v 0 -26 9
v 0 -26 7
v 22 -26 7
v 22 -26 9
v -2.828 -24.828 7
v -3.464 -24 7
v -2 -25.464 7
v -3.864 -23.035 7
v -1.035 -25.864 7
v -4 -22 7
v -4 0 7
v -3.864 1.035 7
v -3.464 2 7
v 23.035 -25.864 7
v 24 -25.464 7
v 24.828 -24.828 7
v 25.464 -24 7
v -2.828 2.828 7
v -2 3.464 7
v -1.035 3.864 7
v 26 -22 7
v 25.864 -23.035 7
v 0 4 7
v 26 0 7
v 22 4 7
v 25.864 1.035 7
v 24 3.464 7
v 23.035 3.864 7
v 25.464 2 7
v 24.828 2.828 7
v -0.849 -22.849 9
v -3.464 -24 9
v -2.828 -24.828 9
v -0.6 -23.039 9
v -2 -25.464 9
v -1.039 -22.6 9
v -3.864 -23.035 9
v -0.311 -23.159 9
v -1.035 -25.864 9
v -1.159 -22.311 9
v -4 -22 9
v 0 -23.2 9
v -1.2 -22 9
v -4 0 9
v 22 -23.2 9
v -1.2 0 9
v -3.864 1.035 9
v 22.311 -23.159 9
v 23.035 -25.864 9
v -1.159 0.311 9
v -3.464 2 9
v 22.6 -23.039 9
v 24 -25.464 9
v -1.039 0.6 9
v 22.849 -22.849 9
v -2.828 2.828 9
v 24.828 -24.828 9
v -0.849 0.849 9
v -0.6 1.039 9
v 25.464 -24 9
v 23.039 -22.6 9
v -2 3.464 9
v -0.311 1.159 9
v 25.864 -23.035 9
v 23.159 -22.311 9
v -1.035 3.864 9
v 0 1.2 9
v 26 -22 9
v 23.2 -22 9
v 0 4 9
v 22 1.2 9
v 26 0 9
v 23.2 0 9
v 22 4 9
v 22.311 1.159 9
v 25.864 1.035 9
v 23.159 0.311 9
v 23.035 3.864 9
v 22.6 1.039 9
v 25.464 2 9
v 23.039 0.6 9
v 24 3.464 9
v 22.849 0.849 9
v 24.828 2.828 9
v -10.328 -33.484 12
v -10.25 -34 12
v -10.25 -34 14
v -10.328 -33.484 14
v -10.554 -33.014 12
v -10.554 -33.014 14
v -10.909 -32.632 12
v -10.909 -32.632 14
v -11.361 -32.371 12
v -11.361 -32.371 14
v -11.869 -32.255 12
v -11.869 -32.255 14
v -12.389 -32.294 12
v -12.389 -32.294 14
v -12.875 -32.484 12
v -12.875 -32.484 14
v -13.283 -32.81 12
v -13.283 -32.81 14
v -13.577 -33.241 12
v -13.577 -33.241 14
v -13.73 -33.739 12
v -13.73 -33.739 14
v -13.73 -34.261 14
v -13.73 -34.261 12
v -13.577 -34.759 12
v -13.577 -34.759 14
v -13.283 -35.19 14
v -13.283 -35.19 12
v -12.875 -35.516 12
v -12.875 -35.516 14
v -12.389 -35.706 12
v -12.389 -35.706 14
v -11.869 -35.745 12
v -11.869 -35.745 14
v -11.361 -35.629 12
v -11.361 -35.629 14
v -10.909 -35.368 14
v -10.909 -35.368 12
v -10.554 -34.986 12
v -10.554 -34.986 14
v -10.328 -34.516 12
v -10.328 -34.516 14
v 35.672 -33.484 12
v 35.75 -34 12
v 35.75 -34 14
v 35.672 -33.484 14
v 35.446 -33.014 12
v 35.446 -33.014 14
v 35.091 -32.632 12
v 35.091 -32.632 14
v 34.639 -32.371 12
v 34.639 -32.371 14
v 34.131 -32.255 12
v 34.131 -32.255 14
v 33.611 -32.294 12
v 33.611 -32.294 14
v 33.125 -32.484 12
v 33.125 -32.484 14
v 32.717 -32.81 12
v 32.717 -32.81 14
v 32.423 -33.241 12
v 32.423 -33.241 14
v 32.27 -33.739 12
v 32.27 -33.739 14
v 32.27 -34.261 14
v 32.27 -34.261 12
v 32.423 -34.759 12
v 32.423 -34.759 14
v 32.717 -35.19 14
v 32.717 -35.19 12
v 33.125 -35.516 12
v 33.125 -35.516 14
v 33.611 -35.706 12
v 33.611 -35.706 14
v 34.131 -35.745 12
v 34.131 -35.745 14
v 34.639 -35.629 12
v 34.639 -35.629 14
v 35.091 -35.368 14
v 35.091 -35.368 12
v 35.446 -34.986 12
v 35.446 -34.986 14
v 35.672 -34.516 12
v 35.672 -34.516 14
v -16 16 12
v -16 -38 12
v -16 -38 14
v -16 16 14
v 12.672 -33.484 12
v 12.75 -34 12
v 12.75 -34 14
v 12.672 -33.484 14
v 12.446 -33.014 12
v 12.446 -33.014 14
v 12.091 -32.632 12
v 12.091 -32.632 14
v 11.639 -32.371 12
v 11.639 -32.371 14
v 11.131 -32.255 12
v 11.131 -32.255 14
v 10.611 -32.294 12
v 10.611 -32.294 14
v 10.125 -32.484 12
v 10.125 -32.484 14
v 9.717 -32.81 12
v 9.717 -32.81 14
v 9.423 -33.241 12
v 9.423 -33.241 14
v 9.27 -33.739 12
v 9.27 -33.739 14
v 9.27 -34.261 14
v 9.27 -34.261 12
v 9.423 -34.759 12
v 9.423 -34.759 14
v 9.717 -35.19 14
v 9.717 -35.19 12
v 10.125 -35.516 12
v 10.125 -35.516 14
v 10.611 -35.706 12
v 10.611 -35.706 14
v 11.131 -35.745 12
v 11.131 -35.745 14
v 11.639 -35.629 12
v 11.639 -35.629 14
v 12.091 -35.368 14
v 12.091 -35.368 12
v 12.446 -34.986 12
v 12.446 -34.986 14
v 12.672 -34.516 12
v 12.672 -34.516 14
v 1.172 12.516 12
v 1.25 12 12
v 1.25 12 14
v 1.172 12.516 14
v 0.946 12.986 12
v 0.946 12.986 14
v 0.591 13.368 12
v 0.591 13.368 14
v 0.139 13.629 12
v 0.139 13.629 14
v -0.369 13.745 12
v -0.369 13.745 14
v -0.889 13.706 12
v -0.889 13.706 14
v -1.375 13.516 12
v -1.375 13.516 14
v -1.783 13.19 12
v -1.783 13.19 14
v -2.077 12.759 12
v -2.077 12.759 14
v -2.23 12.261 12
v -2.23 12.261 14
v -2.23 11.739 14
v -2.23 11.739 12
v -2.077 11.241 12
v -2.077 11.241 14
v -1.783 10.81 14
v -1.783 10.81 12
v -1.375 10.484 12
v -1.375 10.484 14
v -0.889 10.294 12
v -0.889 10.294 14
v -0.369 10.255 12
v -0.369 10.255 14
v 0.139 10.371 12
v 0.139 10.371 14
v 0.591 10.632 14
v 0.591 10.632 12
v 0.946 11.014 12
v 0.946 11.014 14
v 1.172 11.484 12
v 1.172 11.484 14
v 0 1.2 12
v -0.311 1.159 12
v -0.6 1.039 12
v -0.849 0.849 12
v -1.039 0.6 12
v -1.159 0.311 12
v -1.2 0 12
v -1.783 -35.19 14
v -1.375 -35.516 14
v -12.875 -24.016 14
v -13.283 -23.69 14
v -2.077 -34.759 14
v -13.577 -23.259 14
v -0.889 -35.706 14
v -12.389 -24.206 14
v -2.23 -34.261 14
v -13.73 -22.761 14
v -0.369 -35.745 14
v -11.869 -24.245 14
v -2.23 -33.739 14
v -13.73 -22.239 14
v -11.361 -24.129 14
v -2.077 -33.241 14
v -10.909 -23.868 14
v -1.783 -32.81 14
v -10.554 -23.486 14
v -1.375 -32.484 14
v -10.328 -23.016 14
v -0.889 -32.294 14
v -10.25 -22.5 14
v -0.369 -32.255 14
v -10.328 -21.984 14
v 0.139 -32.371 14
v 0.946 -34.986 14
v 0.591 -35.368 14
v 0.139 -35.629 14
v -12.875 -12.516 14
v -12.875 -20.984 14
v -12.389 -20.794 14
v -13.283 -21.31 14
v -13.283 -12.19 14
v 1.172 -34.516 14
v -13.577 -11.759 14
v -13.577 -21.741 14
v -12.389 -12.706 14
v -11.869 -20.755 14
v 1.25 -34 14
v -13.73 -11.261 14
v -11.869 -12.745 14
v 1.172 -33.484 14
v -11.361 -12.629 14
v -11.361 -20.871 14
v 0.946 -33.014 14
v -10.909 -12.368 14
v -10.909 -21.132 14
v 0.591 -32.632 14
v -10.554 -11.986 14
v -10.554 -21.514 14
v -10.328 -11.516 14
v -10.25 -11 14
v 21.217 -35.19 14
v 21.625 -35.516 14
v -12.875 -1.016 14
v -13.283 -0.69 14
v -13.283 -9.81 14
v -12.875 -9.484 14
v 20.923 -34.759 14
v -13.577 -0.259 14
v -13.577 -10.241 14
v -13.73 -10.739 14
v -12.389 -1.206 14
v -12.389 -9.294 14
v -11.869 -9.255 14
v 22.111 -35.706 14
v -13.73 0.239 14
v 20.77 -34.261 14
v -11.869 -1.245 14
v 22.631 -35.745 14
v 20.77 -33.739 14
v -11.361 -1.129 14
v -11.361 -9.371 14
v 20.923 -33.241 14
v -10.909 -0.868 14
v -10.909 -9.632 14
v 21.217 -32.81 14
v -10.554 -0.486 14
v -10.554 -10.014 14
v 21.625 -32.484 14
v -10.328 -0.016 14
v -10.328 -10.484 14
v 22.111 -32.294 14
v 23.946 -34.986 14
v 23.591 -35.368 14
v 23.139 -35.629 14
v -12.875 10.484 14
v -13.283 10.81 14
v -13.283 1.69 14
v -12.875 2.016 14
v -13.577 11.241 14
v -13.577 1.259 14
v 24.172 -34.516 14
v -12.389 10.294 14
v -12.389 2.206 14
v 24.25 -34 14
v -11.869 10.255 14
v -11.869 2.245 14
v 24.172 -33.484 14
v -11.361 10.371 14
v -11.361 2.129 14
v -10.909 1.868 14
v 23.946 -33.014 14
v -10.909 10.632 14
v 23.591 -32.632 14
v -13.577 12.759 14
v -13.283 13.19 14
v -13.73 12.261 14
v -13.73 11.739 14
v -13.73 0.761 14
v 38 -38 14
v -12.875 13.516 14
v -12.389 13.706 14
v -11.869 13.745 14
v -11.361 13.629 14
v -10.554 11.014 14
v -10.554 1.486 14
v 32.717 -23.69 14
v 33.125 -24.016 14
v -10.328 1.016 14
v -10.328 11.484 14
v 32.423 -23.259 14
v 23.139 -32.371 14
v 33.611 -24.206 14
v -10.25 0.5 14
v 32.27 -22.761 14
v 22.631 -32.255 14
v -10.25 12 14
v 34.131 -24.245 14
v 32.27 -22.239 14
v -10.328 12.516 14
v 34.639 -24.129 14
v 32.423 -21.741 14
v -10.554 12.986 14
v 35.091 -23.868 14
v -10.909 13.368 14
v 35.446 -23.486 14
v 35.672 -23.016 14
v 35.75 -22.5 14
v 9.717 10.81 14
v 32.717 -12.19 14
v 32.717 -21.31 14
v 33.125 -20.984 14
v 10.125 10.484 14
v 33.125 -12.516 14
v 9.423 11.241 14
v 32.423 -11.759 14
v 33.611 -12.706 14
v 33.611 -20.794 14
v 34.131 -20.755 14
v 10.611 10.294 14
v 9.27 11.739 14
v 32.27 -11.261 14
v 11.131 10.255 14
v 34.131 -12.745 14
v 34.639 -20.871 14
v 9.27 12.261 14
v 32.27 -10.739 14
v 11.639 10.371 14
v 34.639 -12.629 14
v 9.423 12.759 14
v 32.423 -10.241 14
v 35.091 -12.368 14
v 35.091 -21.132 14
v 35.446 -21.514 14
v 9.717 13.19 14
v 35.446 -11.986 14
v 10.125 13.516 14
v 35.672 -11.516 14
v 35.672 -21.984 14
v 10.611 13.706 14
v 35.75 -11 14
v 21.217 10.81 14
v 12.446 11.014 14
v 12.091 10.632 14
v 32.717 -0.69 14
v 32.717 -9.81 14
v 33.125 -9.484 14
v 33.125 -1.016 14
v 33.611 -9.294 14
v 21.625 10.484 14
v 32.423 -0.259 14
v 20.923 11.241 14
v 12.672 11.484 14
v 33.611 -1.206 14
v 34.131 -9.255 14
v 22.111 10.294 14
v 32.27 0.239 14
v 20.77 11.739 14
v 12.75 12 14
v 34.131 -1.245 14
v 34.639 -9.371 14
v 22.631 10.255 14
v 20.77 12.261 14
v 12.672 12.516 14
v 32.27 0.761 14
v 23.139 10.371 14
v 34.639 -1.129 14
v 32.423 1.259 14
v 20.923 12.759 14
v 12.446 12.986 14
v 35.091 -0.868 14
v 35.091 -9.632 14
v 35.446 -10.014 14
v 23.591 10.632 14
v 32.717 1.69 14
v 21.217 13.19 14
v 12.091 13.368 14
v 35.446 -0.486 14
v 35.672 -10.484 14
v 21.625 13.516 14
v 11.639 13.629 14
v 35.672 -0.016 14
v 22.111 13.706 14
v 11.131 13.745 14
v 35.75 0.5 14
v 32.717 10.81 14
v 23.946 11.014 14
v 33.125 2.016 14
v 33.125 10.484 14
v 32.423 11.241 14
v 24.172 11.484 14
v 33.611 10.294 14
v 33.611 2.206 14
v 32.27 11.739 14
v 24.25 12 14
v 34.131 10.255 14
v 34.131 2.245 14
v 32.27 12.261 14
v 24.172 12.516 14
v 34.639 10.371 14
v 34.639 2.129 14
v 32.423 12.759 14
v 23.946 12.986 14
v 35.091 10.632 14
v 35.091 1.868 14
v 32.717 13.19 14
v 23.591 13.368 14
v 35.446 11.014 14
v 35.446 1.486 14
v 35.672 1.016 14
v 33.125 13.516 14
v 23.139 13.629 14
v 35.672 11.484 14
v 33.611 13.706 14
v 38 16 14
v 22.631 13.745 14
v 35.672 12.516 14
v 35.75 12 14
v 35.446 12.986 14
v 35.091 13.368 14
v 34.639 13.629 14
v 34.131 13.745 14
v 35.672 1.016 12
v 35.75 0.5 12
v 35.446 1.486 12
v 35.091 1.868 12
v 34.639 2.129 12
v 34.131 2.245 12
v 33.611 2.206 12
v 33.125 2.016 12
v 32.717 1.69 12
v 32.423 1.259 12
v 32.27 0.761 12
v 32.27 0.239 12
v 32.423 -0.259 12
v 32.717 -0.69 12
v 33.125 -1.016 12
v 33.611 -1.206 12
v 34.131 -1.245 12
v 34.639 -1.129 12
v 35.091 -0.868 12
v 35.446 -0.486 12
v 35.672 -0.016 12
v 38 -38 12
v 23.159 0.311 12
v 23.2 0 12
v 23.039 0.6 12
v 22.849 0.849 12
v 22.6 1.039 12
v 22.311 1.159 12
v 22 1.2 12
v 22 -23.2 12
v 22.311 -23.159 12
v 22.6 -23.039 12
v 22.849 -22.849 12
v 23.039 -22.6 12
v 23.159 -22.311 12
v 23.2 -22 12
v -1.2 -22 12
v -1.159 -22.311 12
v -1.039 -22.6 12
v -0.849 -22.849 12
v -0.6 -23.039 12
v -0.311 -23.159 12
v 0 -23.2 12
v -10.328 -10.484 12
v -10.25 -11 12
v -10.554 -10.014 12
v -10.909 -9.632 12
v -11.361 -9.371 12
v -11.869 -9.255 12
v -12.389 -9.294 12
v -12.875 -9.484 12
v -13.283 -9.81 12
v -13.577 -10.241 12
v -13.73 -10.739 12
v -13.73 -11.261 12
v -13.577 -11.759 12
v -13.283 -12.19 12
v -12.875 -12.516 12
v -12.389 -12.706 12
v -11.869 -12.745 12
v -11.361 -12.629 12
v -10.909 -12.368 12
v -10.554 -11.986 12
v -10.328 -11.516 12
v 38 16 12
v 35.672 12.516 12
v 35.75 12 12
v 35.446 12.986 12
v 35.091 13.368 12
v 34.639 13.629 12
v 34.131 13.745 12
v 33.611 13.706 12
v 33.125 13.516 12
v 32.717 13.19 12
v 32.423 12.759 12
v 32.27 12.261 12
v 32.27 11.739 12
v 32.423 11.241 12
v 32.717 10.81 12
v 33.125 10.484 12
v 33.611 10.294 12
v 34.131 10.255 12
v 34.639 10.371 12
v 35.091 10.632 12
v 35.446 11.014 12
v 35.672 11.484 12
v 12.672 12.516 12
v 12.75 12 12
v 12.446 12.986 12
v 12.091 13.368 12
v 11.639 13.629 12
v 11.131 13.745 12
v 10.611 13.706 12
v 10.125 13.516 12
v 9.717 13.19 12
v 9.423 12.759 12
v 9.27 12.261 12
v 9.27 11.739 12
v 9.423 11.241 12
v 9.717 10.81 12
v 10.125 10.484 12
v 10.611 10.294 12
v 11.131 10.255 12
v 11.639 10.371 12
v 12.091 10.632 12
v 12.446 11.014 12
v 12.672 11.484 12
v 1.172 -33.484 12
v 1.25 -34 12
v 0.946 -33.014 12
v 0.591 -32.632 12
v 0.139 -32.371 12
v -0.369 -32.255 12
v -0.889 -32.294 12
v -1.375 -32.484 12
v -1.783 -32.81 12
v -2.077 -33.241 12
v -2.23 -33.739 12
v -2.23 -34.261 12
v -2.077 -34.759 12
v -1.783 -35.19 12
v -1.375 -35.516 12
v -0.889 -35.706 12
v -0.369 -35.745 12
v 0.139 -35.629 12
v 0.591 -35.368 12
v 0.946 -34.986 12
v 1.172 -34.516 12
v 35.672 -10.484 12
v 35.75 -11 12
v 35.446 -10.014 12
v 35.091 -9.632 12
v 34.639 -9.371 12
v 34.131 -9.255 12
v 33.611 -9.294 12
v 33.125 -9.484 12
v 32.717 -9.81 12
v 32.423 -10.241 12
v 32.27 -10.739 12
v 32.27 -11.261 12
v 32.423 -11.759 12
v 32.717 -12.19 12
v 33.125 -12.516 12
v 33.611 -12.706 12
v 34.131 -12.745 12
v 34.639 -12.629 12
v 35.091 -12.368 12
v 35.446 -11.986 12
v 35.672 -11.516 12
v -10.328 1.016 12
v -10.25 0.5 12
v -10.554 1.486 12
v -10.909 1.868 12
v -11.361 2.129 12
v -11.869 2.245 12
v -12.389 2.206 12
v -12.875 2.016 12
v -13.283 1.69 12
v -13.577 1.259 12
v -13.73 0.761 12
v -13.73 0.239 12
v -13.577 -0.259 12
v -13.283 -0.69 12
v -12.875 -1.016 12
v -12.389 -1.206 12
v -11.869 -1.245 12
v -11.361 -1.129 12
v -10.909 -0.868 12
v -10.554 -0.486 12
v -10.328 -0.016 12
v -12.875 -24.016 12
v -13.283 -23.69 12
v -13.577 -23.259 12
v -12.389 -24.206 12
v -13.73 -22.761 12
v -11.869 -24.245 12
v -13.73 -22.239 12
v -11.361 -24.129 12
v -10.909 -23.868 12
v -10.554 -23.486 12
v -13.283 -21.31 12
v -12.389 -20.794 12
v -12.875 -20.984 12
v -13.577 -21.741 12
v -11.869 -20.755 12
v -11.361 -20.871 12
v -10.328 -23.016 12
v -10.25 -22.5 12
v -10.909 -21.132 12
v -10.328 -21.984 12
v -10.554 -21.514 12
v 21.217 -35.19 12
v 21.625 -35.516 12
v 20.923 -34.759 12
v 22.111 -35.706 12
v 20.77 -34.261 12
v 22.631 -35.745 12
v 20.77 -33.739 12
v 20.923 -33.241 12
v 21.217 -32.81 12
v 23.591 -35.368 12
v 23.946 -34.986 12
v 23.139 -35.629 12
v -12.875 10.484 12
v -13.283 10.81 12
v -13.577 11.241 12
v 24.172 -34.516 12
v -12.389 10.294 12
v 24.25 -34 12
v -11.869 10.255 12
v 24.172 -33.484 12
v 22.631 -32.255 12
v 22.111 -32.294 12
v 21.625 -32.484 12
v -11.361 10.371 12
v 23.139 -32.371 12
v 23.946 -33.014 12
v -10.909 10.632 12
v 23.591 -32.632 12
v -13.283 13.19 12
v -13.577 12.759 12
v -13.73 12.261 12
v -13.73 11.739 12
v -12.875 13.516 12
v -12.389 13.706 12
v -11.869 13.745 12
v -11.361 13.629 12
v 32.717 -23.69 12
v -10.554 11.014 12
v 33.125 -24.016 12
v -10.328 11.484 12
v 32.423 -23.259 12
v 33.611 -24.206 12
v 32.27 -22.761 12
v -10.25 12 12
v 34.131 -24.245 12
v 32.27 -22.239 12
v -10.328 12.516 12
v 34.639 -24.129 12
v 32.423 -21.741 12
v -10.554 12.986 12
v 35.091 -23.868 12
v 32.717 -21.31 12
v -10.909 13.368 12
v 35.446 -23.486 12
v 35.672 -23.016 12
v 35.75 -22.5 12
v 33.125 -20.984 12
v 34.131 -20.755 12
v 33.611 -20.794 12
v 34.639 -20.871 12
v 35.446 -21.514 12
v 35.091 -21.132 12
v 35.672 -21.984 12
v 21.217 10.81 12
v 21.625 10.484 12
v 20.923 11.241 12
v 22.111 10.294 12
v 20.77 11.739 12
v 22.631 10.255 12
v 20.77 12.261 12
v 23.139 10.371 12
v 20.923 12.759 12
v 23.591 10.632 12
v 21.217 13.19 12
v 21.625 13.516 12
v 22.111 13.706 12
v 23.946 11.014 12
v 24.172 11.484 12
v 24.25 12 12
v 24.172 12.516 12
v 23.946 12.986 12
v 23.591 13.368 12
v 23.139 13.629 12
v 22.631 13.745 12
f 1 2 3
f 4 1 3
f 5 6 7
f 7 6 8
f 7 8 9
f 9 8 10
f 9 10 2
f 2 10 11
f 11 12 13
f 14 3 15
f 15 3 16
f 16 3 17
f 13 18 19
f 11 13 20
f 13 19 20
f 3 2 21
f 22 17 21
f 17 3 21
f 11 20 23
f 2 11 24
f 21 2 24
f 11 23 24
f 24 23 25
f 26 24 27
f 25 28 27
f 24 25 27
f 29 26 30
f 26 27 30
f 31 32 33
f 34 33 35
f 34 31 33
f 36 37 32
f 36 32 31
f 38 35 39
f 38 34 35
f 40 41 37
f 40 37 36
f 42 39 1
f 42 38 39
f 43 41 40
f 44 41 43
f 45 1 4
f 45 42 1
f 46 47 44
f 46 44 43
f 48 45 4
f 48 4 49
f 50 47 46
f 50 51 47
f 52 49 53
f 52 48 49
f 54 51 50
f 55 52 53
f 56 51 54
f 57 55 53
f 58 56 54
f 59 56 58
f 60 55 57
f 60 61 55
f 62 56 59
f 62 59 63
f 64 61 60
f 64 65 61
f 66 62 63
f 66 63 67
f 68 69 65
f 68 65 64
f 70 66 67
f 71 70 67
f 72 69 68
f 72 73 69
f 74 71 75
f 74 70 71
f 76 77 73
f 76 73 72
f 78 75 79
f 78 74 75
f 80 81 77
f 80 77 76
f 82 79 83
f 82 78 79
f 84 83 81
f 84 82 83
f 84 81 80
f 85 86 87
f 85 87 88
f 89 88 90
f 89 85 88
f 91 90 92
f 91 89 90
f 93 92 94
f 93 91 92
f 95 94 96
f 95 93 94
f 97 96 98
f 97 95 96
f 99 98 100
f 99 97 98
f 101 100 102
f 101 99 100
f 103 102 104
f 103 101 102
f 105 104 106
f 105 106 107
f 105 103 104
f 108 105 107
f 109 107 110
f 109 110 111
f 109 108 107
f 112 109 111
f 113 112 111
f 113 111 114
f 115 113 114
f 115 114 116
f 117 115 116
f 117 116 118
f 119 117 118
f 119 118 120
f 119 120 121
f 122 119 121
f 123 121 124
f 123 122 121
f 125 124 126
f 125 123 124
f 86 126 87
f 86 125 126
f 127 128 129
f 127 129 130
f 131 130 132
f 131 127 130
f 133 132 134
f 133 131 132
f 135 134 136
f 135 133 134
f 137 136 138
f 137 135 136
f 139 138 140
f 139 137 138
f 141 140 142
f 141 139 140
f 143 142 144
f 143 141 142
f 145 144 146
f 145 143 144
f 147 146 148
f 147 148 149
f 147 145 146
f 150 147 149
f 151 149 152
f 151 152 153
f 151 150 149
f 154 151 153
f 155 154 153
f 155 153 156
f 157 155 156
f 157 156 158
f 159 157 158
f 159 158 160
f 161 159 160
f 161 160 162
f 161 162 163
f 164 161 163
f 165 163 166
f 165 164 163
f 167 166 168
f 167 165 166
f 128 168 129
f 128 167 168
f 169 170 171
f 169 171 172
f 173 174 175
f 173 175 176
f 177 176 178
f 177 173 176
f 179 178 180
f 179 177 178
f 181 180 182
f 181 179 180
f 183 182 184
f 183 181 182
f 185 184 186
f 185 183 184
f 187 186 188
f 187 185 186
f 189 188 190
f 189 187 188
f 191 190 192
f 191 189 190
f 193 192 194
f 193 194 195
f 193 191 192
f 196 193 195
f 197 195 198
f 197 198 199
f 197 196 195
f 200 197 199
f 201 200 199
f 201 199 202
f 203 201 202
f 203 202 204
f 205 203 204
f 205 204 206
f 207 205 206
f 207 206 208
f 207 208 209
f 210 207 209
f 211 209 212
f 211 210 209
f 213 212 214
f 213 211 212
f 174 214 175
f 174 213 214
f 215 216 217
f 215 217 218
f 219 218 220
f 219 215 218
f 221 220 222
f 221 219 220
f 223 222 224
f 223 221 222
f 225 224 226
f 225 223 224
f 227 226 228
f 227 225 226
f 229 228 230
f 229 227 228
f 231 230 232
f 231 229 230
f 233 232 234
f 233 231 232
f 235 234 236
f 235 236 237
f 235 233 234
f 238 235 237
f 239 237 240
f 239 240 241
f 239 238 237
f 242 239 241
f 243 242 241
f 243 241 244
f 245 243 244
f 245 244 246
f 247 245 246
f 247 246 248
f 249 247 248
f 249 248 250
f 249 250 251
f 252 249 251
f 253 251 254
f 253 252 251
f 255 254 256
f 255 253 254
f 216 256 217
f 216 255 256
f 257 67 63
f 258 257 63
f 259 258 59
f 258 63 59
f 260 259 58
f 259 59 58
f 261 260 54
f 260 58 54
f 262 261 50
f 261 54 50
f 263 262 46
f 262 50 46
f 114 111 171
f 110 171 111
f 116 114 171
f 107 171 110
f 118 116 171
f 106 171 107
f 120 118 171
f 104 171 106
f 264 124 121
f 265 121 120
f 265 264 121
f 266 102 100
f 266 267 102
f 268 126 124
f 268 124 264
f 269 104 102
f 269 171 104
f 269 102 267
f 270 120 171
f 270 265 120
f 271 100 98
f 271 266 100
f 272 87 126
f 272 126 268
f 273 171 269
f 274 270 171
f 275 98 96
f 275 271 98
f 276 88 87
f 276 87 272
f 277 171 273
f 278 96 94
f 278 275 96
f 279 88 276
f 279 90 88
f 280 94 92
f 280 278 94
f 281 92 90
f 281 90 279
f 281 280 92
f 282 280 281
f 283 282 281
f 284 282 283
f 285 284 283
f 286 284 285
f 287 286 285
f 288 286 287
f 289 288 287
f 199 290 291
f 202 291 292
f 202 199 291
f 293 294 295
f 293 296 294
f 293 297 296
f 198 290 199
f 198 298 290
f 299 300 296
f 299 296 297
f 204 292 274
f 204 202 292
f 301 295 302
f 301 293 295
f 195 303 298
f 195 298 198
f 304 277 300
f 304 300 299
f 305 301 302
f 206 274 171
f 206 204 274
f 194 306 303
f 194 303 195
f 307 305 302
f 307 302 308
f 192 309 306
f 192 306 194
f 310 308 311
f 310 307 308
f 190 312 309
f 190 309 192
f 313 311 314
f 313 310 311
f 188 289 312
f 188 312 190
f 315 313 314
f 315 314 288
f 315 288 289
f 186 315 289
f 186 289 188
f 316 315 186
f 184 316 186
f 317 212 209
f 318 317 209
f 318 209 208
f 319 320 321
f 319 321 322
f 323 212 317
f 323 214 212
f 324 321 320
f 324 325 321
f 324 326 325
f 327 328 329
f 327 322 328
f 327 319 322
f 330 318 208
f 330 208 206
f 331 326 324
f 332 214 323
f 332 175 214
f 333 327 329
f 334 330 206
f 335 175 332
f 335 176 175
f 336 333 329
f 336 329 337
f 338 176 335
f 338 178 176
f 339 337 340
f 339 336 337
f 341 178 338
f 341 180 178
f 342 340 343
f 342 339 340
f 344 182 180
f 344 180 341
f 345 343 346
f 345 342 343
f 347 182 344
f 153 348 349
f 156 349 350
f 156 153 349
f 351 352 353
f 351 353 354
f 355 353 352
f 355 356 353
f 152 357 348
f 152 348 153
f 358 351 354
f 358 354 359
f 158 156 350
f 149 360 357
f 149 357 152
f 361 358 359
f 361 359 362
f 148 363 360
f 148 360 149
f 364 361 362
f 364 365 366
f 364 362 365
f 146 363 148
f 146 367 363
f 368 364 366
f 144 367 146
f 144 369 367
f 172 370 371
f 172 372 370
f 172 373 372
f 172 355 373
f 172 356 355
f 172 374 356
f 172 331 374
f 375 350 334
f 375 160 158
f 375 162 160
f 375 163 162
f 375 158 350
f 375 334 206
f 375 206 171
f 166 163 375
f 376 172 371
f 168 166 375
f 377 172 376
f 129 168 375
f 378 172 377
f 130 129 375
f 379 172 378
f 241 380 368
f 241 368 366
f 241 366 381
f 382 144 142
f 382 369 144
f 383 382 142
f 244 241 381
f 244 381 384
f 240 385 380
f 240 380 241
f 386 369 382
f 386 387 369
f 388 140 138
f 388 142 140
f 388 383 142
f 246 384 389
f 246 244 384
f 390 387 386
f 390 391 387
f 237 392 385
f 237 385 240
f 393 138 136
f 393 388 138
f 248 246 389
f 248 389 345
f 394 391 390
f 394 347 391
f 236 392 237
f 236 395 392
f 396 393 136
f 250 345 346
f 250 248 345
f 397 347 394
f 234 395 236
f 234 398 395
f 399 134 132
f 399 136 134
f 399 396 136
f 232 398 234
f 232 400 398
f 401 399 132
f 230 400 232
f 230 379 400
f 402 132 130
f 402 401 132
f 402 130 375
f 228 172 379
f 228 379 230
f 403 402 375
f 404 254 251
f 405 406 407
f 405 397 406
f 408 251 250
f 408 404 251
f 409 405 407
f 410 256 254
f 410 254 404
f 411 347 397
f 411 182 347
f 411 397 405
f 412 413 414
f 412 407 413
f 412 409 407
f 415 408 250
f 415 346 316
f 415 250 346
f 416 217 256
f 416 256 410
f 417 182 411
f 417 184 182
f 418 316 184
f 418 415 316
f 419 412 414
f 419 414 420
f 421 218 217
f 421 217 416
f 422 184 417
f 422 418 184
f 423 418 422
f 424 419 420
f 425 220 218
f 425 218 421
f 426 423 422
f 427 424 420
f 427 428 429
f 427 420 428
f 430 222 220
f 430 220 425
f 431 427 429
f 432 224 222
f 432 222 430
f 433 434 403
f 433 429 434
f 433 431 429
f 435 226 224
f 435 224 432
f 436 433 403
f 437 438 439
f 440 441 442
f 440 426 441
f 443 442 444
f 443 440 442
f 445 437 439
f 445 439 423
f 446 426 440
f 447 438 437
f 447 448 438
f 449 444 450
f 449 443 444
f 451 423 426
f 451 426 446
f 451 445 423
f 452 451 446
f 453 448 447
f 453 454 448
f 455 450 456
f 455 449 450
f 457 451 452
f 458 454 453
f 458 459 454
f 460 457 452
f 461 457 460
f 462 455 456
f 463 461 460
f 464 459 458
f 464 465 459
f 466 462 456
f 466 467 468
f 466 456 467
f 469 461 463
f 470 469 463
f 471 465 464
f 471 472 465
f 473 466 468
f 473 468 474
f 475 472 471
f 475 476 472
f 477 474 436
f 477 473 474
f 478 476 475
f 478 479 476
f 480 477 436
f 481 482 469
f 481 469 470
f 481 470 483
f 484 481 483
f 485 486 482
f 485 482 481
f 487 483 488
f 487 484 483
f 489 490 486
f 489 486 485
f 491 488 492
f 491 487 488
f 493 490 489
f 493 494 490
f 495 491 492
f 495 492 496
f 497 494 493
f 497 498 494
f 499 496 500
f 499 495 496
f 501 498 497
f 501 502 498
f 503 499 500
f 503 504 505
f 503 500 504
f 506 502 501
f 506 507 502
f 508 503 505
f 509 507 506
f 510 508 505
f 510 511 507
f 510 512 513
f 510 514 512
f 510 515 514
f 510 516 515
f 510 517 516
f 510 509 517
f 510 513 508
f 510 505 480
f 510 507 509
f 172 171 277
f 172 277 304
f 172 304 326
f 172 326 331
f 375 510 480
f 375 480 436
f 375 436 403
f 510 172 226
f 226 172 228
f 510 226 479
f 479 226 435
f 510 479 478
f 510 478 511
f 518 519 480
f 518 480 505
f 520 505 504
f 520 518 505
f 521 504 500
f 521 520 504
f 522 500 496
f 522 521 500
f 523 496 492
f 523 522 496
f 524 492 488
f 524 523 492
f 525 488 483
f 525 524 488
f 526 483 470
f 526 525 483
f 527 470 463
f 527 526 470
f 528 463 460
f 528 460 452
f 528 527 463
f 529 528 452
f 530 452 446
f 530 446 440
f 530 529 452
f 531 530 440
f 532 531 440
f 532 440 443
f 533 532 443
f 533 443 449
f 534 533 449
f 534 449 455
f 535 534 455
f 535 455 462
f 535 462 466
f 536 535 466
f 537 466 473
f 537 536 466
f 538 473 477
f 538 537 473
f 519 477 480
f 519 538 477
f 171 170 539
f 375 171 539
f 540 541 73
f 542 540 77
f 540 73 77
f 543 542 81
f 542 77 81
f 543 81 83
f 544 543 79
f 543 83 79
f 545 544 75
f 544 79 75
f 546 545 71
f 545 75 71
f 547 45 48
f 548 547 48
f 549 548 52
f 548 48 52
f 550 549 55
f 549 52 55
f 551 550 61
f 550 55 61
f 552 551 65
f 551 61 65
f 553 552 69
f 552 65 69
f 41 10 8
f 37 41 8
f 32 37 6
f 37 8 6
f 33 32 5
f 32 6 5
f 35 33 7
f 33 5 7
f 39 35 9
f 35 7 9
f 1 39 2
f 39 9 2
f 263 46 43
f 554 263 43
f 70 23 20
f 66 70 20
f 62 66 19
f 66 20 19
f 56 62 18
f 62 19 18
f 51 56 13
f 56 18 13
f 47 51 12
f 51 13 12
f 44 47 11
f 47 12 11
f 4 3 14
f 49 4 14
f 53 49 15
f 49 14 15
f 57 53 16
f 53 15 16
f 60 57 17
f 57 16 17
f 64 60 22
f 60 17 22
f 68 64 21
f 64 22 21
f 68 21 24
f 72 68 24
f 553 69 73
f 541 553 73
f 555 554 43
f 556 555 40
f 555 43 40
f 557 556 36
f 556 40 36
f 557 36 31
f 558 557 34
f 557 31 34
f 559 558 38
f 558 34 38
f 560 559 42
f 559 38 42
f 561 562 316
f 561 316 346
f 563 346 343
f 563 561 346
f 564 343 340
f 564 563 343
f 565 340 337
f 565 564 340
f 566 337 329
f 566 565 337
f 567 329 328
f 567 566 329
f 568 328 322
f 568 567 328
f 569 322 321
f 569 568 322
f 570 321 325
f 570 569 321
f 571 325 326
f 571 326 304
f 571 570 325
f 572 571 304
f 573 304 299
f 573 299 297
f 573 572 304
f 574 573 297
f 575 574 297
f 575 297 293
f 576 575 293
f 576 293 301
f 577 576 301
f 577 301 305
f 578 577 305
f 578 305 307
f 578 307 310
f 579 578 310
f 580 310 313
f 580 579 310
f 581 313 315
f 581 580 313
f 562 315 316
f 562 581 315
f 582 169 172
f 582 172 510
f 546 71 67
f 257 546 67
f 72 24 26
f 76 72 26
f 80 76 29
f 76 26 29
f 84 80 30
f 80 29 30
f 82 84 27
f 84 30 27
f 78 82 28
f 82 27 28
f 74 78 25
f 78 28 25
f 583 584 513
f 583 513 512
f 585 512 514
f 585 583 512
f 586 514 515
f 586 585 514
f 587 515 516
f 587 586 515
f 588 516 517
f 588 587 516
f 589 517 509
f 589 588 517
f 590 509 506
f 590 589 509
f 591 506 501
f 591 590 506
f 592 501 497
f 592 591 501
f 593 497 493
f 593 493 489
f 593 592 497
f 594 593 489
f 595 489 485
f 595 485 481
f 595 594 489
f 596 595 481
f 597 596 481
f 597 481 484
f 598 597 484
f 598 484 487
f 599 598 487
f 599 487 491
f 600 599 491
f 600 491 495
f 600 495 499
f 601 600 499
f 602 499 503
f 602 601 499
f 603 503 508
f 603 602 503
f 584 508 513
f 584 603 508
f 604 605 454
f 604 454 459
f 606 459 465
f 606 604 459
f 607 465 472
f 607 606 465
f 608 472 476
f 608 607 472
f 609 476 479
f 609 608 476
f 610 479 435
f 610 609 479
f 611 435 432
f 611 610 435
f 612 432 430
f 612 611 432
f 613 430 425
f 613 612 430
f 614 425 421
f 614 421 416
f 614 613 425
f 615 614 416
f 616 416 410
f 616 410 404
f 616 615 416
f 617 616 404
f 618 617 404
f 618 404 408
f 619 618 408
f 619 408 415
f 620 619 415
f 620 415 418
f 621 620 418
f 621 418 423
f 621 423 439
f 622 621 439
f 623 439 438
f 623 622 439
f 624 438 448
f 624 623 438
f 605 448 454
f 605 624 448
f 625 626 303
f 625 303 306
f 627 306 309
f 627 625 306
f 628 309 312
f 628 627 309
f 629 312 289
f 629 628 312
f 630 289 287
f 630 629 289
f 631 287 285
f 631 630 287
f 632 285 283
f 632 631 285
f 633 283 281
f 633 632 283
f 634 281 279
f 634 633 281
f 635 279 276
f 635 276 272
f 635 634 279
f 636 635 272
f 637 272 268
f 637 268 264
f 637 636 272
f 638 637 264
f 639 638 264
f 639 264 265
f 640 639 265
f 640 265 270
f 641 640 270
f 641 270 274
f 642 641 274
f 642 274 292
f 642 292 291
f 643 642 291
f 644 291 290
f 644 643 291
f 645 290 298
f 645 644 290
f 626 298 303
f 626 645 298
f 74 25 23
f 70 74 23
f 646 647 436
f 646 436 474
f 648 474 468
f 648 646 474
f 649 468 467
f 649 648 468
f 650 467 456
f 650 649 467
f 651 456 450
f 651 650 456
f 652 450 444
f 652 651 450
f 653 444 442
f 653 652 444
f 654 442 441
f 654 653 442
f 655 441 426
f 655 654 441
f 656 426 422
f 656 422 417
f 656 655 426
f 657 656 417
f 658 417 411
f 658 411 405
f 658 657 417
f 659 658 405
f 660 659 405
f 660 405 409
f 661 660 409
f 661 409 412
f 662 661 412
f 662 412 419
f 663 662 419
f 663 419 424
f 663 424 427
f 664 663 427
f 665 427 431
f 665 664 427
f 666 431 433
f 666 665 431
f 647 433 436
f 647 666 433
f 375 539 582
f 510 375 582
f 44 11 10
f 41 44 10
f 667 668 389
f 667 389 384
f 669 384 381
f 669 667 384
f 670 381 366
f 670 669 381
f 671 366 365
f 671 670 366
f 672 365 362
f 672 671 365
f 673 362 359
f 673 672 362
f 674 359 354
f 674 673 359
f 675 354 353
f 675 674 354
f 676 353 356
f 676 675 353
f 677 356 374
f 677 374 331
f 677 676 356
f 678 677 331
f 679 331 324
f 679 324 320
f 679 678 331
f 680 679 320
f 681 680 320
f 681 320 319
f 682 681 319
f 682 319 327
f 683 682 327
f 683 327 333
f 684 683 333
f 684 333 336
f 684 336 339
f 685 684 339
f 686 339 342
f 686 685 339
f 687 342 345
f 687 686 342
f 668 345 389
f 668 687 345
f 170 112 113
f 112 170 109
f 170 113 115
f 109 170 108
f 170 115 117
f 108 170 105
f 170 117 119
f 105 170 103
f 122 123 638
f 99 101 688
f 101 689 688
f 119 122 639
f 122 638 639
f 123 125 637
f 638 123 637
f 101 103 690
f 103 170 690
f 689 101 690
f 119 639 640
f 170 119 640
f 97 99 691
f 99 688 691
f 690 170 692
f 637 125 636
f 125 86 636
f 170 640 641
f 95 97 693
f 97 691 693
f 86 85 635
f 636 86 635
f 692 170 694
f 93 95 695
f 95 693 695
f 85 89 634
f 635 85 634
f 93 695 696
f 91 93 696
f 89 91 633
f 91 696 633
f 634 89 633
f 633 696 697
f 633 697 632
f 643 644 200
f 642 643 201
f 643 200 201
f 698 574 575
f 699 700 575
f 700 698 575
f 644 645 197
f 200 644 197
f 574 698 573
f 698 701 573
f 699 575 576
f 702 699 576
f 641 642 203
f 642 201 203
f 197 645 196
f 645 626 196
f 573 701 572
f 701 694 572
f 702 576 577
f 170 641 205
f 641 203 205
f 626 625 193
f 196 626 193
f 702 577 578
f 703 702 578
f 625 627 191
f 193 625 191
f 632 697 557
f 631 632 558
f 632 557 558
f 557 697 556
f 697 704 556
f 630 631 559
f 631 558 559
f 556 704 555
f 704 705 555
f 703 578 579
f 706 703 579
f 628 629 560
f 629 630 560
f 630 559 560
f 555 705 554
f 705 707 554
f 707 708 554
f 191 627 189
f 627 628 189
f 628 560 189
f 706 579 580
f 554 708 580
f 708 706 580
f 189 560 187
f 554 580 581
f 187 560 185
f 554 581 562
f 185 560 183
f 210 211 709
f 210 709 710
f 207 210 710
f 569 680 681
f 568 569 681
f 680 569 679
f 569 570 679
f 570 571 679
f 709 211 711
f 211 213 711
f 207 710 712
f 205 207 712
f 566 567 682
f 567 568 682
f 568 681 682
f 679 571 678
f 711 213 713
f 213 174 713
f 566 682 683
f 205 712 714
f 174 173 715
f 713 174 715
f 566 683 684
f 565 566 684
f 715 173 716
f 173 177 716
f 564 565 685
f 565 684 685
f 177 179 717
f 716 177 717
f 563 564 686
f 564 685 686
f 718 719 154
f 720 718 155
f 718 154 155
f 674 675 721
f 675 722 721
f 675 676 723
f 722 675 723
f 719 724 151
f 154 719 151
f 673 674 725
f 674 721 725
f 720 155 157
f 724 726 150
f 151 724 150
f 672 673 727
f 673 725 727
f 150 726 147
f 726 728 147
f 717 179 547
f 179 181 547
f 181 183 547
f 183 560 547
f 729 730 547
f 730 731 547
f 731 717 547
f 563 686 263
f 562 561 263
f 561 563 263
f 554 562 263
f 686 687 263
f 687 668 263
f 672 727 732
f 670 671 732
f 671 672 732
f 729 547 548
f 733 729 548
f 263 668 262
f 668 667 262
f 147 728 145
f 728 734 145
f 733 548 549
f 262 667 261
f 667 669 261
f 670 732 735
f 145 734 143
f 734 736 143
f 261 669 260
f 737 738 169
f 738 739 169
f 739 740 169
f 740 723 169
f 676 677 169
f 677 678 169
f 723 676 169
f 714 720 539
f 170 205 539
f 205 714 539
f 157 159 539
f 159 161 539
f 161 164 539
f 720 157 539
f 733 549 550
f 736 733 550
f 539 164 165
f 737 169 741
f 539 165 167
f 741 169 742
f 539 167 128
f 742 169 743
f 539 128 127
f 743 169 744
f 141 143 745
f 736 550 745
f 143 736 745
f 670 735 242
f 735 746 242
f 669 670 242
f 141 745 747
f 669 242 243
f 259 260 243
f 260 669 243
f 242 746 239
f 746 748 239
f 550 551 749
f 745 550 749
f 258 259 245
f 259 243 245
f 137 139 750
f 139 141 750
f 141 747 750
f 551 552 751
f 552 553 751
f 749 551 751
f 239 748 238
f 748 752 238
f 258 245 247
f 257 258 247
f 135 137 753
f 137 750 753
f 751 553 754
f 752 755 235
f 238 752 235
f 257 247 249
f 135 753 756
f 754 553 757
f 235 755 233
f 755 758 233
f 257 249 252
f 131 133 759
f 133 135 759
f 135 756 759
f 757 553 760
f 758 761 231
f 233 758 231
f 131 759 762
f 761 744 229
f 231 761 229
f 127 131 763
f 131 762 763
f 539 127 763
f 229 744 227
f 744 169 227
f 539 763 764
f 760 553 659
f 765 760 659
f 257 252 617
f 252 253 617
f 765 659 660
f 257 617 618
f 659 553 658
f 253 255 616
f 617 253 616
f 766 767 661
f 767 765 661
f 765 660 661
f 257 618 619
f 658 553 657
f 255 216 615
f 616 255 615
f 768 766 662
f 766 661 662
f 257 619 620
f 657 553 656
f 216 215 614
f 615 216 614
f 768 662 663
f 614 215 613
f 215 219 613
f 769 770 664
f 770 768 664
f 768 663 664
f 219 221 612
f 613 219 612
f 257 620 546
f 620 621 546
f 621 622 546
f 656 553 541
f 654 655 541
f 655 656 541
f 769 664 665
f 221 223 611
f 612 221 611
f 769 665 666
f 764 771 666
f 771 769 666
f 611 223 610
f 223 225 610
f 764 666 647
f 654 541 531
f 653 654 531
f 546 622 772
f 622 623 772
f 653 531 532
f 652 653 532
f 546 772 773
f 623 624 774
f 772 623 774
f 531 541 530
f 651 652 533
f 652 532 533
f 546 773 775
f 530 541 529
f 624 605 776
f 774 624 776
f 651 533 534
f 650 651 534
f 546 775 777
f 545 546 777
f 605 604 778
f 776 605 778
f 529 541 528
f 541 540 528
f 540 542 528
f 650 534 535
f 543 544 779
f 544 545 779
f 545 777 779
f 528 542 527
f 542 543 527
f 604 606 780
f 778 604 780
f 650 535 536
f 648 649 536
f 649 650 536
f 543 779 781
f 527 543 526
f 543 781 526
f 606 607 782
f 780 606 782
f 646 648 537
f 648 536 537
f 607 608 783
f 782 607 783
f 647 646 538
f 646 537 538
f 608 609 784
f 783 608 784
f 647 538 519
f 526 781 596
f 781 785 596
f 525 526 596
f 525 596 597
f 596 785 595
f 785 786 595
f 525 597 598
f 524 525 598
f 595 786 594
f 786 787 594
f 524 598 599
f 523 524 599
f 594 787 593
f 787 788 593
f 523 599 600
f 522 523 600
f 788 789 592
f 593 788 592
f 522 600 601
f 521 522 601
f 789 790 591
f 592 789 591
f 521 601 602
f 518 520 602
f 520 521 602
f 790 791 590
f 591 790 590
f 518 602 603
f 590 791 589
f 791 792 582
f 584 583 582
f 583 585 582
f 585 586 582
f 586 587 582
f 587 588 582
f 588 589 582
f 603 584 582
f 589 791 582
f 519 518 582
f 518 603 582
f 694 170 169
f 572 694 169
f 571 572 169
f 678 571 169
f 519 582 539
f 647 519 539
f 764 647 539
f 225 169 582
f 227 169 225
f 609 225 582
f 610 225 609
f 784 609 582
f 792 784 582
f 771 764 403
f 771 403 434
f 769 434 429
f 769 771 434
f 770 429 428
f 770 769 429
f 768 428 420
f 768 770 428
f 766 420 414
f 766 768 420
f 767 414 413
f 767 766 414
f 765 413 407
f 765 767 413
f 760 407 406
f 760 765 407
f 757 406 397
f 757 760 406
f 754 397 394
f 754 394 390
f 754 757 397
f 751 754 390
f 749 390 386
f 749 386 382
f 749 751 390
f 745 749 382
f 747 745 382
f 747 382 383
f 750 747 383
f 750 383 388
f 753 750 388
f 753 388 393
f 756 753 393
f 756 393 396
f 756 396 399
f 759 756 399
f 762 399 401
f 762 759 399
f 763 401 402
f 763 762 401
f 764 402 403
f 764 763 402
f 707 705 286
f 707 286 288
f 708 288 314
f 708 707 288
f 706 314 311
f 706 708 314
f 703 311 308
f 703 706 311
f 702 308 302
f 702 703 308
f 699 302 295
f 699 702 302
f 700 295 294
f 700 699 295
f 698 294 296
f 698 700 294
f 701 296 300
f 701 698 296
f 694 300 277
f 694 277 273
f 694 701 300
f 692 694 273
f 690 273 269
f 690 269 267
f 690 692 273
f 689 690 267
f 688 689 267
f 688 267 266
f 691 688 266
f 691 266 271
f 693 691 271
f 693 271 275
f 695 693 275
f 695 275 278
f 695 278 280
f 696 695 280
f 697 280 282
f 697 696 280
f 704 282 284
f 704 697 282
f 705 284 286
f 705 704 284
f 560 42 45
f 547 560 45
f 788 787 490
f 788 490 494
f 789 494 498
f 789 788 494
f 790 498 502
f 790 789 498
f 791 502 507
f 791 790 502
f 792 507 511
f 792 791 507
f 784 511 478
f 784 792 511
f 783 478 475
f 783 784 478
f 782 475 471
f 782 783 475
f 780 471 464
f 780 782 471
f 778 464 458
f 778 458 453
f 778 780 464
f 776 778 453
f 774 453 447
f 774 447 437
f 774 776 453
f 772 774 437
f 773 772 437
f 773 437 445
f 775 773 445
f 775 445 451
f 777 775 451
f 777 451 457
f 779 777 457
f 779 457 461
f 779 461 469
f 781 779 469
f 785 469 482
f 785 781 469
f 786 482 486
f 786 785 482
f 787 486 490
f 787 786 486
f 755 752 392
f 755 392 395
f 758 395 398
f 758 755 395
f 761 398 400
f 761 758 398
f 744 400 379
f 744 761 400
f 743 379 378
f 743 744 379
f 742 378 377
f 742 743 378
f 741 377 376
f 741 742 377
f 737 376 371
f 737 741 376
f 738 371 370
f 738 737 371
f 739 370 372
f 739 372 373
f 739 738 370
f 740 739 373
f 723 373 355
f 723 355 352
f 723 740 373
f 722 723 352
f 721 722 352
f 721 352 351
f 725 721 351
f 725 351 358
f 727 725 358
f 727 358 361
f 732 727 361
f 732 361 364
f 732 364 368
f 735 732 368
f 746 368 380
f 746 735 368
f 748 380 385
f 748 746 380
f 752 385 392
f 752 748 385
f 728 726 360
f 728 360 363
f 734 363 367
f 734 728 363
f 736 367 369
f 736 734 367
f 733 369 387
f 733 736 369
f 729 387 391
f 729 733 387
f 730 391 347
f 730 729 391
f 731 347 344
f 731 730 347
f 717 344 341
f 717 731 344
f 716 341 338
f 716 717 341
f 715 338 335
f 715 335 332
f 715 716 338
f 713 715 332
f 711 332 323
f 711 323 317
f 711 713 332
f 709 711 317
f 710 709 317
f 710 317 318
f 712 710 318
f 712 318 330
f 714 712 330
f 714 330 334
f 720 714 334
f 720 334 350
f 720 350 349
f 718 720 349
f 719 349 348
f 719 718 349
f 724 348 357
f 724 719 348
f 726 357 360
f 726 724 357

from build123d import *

# Parameters (mm, degrees)
PAD003_DEPTH = 2
SKETCH013_W  = 54
SKETCH013_H  = 54
SKETCH013_R  = 1.75
PAD004_DEPTH = 2


with BuildPart() as part:
    # Sketch016 → Pad003 (new body)
    with BuildSketch(Plane.XY.offset(7)):
        with BuildLine():
            ThreePointArc((26, 0), (24.828437, 2.828417), (22.000028, 4))
            Line((22.000028, 4), (0, 4))
            ThreePointArc((0, 4), (-2.828427, 2.828427), (-4, 0))
            Line((-4, 0), (-4, -22.000028))
            ThreePointArc((-4, -22.000028), (-2.828417, -24.828437), (0, -26))
            Line((0, -26), (22.000028, -26))
            ThreePointArc((22.000028, -26), (24.828427, -24.828427), (26, -22.000028))
            Line((26, -22.000028), (26, 0))
        make_face()
    extrude(amount=PAD003_DEPTH)

    # Sketch014 → AdditiveLoft section 0
    with BuildSketch(Plane.XY.offset(12)):
        with BuildLine():
            ThreePointArc((23.2, 0), (22.848528, 0.848529), (21.999999, 1.2))
            Line((21.999999, 1.2), (0, 1.2))
            ThreePointArc((0, 1.2), (-0.848528, 0.848528), (-1.2, 0))
            Line((-1.2, 0), (-1.2, -21.999999))
            ThreePointArc((-1.2, -21.999999), (-0.848529, -22.848528), (0, -23.2))
            Line((0, -23.2), (21.999999, -23.2))
            ThreePointArc((21.999999, -23.2), (22.848528, -22.848528), (23.2, -21.999999))
            Line((23.2, -21.999999), (23.2, 0))
        make_face()
    # Sketch015 → AdditiveLoft section 1
    with BuildSketch(Plane.XY.offset(7)):
        with BuildLine():
            ThreePointArc((23.2, 0), (22.848528, 0.848529), (21.999999, 1.2))
            Line((21.999999, 1.2), (0, 1.2))
            ThreePointArc((0, 1.2), (-0.848528, 0.848528), (-1.2, 0))
            Line((-1.2, 0), (-1.2, -21.999999))
            ThreePointArc((-1.2, -21.999999), (-0.848529, -22.848528), (0, -23.2))
            Line((0, -23.2), (21.999999, -23.2))
            ThreePointArc((21.999999, -23.2), (22.848528, -22.848528), (23.2, -21.999999))
            Line((23.2, -21.999999), (23.2, 0))
        make_face()
    loft()

    # Sketch013 → Pad004 (join)
    with BuildSketch(Plane.XY.offset(12)):
        with Locations((11, -11)):
            Rectangle(SKETCH013_W, SKETCH013_H)
        with Locations((-12, 12)):
            Circle(SKETCH013_R, mode=Mode.SUBTRACT)
        with Locations((34, 12)):
            Circle(SKETCH013_R, mode=Mode.SUBTRACT)
        with Locations((34, -34)):
            Circle(SKETCH013_R, mode=Mode.SUBTRACT)
        with Locations((-12, -34)):
            Circle(SKETCH013_R, mode=Mode.SUBTRACT)
        with Locations((34, -11)):
            Circle(SKETCH013_R, mode=Mode.SUBTRACT)
        with Locations((34, 0.5)):
            Circle(SKETCH013_R, mode=Mode.SUBTRACT)
        with Locations((34, -22.5)):
            Circle(SKETCH013_R, mode=Mode.SUBTRACT)
        with Locations((22.5, -34)):
            Circle(SKETCH013_R, mode=Mode.SUBTRACT)
        with Locations((11, -34)):
            Circle(SKETCH013_R, mode=Mode.SUBTRACT)
        with Locations((-0.5, -34)):
            Circle(SKETCH013_R, mode=Mode.SUBTRACT)
        with Locations((-12, -22.5)):
            Circle(SKETCH013_R, mode=Mode.SUBTRACT)
        with Locations((-12, -11)):
            Circle(SKETCH013_R, mode=Mode.SUBTRACT)
        with Locations((-12, 0.5)):
            Circle(SKETCH013_R, mode=Mode.SUBTRACT)
        with Locations((11, 12)):
            Circle(SKETCH013_R, mode=Mode.SUBTRACT)
        with Locations((22.5, 12)):
            Circle(SKETCH013_R, mode=Mode.SUBTRACT)
        with Locations((-0.5, 12)):
            Circle(SKETCH013_R, mode=Mode.SUBTRACT)
    extrude(amount=PAD004_DEPTH)


solid = part.part
